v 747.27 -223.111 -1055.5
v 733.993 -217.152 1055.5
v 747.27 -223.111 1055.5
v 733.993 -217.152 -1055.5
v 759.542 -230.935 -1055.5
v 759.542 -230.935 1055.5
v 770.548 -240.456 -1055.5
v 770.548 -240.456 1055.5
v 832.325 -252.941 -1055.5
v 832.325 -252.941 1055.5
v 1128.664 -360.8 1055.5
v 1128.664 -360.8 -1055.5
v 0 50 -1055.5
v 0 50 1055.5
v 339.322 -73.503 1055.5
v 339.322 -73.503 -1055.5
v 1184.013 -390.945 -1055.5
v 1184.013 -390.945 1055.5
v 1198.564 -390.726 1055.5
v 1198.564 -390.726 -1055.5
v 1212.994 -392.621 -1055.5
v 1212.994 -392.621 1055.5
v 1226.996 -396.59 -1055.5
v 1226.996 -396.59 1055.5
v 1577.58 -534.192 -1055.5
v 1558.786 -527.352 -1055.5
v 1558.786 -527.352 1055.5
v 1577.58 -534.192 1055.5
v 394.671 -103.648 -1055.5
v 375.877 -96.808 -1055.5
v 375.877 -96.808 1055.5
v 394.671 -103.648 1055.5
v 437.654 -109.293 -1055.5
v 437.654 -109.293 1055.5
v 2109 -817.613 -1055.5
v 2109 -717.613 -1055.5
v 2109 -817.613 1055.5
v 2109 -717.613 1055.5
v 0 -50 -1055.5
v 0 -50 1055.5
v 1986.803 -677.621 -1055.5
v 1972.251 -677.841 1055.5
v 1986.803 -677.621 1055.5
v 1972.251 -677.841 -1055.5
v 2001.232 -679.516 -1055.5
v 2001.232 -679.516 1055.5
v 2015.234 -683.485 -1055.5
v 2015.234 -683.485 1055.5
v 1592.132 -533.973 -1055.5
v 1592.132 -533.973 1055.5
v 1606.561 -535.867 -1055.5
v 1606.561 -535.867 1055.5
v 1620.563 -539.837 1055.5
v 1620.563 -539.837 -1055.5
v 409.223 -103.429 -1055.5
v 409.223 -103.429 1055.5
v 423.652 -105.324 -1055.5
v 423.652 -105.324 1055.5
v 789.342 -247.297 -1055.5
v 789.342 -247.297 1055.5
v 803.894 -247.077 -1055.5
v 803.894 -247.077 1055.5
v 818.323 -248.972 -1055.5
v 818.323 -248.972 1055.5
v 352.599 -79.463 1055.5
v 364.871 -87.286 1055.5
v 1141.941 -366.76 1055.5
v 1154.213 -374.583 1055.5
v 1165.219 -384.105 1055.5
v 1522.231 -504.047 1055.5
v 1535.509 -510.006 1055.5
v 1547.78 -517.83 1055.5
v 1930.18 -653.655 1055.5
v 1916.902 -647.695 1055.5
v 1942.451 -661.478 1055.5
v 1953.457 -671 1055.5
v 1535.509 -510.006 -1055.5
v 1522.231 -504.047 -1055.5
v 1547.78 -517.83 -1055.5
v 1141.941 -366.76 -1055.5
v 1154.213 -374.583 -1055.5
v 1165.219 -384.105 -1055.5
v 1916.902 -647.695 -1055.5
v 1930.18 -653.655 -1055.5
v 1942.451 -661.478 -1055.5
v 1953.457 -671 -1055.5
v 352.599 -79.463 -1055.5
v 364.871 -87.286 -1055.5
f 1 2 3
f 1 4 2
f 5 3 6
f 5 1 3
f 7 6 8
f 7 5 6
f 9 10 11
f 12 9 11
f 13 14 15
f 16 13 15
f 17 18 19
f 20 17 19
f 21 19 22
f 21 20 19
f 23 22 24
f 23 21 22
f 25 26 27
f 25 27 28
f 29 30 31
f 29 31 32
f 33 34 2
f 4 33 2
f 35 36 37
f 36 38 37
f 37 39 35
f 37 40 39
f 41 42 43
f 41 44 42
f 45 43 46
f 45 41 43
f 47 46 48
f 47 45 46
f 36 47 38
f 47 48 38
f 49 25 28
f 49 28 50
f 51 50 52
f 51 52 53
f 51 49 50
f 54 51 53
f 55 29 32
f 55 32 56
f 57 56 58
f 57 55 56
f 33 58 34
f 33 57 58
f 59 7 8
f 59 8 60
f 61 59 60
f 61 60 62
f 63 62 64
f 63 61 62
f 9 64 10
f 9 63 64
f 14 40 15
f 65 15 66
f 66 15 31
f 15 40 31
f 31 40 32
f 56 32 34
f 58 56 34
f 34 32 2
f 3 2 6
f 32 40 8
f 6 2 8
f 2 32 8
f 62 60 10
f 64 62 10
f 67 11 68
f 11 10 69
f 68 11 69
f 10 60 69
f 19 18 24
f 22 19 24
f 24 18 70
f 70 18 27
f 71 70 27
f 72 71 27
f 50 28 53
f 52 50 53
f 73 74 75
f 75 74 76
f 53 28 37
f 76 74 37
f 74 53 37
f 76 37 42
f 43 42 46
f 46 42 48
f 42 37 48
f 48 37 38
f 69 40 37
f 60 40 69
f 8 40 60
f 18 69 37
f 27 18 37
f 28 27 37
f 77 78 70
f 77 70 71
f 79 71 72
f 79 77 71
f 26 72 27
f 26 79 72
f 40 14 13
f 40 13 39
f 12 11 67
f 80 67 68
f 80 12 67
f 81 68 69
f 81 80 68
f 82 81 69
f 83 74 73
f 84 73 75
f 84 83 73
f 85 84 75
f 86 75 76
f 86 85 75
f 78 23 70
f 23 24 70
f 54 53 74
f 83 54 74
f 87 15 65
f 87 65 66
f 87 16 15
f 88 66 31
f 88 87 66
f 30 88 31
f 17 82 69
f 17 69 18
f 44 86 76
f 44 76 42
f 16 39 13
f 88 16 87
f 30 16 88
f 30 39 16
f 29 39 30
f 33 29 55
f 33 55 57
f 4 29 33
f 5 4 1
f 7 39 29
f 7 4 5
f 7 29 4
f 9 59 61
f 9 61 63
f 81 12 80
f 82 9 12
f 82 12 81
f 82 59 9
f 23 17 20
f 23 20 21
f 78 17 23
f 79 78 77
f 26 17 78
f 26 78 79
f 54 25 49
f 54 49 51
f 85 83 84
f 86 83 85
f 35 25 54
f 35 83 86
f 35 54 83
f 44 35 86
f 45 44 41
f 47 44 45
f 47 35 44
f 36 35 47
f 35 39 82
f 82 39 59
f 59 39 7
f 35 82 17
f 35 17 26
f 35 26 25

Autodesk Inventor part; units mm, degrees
ref_plane "XZ Plane" through (0, 0, 0) normal (0, 1, 0) x (-1, 0, 0)
sketch "Sketch1" plane through (0, 0, 0) normal (1, 0, 0) x (0, 1, 0)
  line L0 (-50, 1055.5) -> (50, 1055.5)
  line L1 (50, 1055.5) -> (50, -1055.5)
  line L2 (50, -1055.5) -> (-50, -1055.5)
  line L3 (-50, -1055.5) -> (-50, 1055.5)
  line L4 (-50, 1055.5) -> (50, -1055.5) construction
  line L5 (50, 1055.5) -> (-50, -1055.5) construction
  point P0 (0, 0)
  dimension "d0" = 100
  dimension "d1" = 2111
ref_plane "Work Plane2" through (2109, 0, 0) normal (1, 0, 0) x (0, 1, 0)
ref_plane "Work Plane1" through (0, 0, 0) normal (1, 0, 0) x (0, 1, 0)
sketch "Sketch3" plane through (2109, 0, 0) normal (1, 0, 0) x (0, 1, 0)
  line L0 (-50, 1055.5) -> (50, 1055.5) projected
  point P0 (0, 0)
ref_plane "Work Plane3" through (0, -50, 1055.5) normal (0, 0, -1) x (0, 1, 0)
sketch "Sketch4" plane through (0, -50, 1055.5) normal (0, 0, -1) x (0, 1, 0)
  line L0 (0, 2109) -> (100, 2109) projected
  line L1 (100, 0) -> (-667.6132, 2109)
  line L2 (100, 0) -> (2344.3509, 0) construction
  line L3 (0, 0) -> (-767.6132, 2109)
  line L4 (0, 0) -> (2244.3509, 0) construction
  line L5 (-667.6132, 2109) -> (-767.6132, 2109)
  line L6 (100, 0) -> (0, 0)
  point P0 (50, 0)
  dimension "d4" = 110
  dimension "d5" = 110
extrude "Extrusion1" add sketch "Sketch4" along normal blind 2111
sketch "Sketch5" plane through (0, -50, -1055.5) normal (0, 0, -1) x (-1, 0, 0)
  line L0 (0, 100) -> (-2109, -667.6132) projected
  line L1 (0, 100) -> (-375.877, -36.8081)
  line L2 (-375.877, -36.8081) -> (-375.877, -46.8081)
  line L3 (-375.877, -46.8081) -> (-394.6709, -53.6485)
  line L4 (-394.6709, -53.6485) -> (-394.6709, -43.6485)
  line L5 (-394.6709, -43.6485) -> (-770.5479, -180.4565)
  line L6 (-770.5479, -180.4565) -> (-770.5479, -190.4565)
  line L7 (-770.5479, -190.4565) -> (-789.3418, -197.2969)
  line L8 (-789.3418, -197.2969) -> (-789.3418, -187.2969)
  line L9 (-789.3418, -187.2969) -> (-1165.2188, -324.105)
  line L10 (-1165.2188, -324.105) -> (-1165.2188, -334.105)
  line L11 (-1165.2188, -334.105) -> (-1184.0127, -340.9454)
  line L12 (-1184.0127, -340.9454) -> (-1184.0127, -330.9454)
  line L13 (-1184.0127, -330.9454) -> (-1559.8898, -467.7534)
  line L14 (-1559.8898, -467.7534) -> (-1558.7864, -477.3518)
  line L15 (-1558.7864, -477.3518) -> (-1577.5802, -484.1922)
  line L16 (-1577.5802, -484.1922) -> (-1577.5802, -474.1922)
  line L17 (-1577.5802, -474.1922) -> (-1953.4573, -611.0003)
  line L18 (-1953.4573, -611.0003) -> (-1953.4573, -621.0003)
  line L19 (-1953.4573, -621.0003) -> (-1972.2511, -627.8407)
  line L20 (-1972.2511, -627.8407) -> (-1972.2511, -617.8407)
  line L21 (-1972.2511, -617.8407) -> (-375.877, -36.8081)
  point P0 (0, 50)
  dimension "d8" = 400
  dimension "d9" = 10
  dimension "d10" = 20
  dimension "d11" = 400
  dimension "d12" = 20
  dimension "d13" = 400
  dimension "d14" = 20
  dimension "d15" = 400
  dimension "d16" = 20
  dimension "d17" = 400
  dimension "d18" = 20
extrude "Extrusion2" cut sketch "Sketch5" against normal through all
fillet "Fillet1" radius 100 10 edges at (1972.2511, -667.8407, 0) (1953.4573, -661.0003, 0) (1577.5802, -524.1922, 0) (1559.8898, -517.7534, 0) (1184.0127, -380.9454, 0) (1165.2188, -374.105, 0) (789.3418, -237.2969, 0) (770.5479, -230.4565, 0) (394.6709, -93.6485, 0) (375.877, -86.8081, 0)
properties part number "side_curve_panel_01" material "Wood (Maple)"
